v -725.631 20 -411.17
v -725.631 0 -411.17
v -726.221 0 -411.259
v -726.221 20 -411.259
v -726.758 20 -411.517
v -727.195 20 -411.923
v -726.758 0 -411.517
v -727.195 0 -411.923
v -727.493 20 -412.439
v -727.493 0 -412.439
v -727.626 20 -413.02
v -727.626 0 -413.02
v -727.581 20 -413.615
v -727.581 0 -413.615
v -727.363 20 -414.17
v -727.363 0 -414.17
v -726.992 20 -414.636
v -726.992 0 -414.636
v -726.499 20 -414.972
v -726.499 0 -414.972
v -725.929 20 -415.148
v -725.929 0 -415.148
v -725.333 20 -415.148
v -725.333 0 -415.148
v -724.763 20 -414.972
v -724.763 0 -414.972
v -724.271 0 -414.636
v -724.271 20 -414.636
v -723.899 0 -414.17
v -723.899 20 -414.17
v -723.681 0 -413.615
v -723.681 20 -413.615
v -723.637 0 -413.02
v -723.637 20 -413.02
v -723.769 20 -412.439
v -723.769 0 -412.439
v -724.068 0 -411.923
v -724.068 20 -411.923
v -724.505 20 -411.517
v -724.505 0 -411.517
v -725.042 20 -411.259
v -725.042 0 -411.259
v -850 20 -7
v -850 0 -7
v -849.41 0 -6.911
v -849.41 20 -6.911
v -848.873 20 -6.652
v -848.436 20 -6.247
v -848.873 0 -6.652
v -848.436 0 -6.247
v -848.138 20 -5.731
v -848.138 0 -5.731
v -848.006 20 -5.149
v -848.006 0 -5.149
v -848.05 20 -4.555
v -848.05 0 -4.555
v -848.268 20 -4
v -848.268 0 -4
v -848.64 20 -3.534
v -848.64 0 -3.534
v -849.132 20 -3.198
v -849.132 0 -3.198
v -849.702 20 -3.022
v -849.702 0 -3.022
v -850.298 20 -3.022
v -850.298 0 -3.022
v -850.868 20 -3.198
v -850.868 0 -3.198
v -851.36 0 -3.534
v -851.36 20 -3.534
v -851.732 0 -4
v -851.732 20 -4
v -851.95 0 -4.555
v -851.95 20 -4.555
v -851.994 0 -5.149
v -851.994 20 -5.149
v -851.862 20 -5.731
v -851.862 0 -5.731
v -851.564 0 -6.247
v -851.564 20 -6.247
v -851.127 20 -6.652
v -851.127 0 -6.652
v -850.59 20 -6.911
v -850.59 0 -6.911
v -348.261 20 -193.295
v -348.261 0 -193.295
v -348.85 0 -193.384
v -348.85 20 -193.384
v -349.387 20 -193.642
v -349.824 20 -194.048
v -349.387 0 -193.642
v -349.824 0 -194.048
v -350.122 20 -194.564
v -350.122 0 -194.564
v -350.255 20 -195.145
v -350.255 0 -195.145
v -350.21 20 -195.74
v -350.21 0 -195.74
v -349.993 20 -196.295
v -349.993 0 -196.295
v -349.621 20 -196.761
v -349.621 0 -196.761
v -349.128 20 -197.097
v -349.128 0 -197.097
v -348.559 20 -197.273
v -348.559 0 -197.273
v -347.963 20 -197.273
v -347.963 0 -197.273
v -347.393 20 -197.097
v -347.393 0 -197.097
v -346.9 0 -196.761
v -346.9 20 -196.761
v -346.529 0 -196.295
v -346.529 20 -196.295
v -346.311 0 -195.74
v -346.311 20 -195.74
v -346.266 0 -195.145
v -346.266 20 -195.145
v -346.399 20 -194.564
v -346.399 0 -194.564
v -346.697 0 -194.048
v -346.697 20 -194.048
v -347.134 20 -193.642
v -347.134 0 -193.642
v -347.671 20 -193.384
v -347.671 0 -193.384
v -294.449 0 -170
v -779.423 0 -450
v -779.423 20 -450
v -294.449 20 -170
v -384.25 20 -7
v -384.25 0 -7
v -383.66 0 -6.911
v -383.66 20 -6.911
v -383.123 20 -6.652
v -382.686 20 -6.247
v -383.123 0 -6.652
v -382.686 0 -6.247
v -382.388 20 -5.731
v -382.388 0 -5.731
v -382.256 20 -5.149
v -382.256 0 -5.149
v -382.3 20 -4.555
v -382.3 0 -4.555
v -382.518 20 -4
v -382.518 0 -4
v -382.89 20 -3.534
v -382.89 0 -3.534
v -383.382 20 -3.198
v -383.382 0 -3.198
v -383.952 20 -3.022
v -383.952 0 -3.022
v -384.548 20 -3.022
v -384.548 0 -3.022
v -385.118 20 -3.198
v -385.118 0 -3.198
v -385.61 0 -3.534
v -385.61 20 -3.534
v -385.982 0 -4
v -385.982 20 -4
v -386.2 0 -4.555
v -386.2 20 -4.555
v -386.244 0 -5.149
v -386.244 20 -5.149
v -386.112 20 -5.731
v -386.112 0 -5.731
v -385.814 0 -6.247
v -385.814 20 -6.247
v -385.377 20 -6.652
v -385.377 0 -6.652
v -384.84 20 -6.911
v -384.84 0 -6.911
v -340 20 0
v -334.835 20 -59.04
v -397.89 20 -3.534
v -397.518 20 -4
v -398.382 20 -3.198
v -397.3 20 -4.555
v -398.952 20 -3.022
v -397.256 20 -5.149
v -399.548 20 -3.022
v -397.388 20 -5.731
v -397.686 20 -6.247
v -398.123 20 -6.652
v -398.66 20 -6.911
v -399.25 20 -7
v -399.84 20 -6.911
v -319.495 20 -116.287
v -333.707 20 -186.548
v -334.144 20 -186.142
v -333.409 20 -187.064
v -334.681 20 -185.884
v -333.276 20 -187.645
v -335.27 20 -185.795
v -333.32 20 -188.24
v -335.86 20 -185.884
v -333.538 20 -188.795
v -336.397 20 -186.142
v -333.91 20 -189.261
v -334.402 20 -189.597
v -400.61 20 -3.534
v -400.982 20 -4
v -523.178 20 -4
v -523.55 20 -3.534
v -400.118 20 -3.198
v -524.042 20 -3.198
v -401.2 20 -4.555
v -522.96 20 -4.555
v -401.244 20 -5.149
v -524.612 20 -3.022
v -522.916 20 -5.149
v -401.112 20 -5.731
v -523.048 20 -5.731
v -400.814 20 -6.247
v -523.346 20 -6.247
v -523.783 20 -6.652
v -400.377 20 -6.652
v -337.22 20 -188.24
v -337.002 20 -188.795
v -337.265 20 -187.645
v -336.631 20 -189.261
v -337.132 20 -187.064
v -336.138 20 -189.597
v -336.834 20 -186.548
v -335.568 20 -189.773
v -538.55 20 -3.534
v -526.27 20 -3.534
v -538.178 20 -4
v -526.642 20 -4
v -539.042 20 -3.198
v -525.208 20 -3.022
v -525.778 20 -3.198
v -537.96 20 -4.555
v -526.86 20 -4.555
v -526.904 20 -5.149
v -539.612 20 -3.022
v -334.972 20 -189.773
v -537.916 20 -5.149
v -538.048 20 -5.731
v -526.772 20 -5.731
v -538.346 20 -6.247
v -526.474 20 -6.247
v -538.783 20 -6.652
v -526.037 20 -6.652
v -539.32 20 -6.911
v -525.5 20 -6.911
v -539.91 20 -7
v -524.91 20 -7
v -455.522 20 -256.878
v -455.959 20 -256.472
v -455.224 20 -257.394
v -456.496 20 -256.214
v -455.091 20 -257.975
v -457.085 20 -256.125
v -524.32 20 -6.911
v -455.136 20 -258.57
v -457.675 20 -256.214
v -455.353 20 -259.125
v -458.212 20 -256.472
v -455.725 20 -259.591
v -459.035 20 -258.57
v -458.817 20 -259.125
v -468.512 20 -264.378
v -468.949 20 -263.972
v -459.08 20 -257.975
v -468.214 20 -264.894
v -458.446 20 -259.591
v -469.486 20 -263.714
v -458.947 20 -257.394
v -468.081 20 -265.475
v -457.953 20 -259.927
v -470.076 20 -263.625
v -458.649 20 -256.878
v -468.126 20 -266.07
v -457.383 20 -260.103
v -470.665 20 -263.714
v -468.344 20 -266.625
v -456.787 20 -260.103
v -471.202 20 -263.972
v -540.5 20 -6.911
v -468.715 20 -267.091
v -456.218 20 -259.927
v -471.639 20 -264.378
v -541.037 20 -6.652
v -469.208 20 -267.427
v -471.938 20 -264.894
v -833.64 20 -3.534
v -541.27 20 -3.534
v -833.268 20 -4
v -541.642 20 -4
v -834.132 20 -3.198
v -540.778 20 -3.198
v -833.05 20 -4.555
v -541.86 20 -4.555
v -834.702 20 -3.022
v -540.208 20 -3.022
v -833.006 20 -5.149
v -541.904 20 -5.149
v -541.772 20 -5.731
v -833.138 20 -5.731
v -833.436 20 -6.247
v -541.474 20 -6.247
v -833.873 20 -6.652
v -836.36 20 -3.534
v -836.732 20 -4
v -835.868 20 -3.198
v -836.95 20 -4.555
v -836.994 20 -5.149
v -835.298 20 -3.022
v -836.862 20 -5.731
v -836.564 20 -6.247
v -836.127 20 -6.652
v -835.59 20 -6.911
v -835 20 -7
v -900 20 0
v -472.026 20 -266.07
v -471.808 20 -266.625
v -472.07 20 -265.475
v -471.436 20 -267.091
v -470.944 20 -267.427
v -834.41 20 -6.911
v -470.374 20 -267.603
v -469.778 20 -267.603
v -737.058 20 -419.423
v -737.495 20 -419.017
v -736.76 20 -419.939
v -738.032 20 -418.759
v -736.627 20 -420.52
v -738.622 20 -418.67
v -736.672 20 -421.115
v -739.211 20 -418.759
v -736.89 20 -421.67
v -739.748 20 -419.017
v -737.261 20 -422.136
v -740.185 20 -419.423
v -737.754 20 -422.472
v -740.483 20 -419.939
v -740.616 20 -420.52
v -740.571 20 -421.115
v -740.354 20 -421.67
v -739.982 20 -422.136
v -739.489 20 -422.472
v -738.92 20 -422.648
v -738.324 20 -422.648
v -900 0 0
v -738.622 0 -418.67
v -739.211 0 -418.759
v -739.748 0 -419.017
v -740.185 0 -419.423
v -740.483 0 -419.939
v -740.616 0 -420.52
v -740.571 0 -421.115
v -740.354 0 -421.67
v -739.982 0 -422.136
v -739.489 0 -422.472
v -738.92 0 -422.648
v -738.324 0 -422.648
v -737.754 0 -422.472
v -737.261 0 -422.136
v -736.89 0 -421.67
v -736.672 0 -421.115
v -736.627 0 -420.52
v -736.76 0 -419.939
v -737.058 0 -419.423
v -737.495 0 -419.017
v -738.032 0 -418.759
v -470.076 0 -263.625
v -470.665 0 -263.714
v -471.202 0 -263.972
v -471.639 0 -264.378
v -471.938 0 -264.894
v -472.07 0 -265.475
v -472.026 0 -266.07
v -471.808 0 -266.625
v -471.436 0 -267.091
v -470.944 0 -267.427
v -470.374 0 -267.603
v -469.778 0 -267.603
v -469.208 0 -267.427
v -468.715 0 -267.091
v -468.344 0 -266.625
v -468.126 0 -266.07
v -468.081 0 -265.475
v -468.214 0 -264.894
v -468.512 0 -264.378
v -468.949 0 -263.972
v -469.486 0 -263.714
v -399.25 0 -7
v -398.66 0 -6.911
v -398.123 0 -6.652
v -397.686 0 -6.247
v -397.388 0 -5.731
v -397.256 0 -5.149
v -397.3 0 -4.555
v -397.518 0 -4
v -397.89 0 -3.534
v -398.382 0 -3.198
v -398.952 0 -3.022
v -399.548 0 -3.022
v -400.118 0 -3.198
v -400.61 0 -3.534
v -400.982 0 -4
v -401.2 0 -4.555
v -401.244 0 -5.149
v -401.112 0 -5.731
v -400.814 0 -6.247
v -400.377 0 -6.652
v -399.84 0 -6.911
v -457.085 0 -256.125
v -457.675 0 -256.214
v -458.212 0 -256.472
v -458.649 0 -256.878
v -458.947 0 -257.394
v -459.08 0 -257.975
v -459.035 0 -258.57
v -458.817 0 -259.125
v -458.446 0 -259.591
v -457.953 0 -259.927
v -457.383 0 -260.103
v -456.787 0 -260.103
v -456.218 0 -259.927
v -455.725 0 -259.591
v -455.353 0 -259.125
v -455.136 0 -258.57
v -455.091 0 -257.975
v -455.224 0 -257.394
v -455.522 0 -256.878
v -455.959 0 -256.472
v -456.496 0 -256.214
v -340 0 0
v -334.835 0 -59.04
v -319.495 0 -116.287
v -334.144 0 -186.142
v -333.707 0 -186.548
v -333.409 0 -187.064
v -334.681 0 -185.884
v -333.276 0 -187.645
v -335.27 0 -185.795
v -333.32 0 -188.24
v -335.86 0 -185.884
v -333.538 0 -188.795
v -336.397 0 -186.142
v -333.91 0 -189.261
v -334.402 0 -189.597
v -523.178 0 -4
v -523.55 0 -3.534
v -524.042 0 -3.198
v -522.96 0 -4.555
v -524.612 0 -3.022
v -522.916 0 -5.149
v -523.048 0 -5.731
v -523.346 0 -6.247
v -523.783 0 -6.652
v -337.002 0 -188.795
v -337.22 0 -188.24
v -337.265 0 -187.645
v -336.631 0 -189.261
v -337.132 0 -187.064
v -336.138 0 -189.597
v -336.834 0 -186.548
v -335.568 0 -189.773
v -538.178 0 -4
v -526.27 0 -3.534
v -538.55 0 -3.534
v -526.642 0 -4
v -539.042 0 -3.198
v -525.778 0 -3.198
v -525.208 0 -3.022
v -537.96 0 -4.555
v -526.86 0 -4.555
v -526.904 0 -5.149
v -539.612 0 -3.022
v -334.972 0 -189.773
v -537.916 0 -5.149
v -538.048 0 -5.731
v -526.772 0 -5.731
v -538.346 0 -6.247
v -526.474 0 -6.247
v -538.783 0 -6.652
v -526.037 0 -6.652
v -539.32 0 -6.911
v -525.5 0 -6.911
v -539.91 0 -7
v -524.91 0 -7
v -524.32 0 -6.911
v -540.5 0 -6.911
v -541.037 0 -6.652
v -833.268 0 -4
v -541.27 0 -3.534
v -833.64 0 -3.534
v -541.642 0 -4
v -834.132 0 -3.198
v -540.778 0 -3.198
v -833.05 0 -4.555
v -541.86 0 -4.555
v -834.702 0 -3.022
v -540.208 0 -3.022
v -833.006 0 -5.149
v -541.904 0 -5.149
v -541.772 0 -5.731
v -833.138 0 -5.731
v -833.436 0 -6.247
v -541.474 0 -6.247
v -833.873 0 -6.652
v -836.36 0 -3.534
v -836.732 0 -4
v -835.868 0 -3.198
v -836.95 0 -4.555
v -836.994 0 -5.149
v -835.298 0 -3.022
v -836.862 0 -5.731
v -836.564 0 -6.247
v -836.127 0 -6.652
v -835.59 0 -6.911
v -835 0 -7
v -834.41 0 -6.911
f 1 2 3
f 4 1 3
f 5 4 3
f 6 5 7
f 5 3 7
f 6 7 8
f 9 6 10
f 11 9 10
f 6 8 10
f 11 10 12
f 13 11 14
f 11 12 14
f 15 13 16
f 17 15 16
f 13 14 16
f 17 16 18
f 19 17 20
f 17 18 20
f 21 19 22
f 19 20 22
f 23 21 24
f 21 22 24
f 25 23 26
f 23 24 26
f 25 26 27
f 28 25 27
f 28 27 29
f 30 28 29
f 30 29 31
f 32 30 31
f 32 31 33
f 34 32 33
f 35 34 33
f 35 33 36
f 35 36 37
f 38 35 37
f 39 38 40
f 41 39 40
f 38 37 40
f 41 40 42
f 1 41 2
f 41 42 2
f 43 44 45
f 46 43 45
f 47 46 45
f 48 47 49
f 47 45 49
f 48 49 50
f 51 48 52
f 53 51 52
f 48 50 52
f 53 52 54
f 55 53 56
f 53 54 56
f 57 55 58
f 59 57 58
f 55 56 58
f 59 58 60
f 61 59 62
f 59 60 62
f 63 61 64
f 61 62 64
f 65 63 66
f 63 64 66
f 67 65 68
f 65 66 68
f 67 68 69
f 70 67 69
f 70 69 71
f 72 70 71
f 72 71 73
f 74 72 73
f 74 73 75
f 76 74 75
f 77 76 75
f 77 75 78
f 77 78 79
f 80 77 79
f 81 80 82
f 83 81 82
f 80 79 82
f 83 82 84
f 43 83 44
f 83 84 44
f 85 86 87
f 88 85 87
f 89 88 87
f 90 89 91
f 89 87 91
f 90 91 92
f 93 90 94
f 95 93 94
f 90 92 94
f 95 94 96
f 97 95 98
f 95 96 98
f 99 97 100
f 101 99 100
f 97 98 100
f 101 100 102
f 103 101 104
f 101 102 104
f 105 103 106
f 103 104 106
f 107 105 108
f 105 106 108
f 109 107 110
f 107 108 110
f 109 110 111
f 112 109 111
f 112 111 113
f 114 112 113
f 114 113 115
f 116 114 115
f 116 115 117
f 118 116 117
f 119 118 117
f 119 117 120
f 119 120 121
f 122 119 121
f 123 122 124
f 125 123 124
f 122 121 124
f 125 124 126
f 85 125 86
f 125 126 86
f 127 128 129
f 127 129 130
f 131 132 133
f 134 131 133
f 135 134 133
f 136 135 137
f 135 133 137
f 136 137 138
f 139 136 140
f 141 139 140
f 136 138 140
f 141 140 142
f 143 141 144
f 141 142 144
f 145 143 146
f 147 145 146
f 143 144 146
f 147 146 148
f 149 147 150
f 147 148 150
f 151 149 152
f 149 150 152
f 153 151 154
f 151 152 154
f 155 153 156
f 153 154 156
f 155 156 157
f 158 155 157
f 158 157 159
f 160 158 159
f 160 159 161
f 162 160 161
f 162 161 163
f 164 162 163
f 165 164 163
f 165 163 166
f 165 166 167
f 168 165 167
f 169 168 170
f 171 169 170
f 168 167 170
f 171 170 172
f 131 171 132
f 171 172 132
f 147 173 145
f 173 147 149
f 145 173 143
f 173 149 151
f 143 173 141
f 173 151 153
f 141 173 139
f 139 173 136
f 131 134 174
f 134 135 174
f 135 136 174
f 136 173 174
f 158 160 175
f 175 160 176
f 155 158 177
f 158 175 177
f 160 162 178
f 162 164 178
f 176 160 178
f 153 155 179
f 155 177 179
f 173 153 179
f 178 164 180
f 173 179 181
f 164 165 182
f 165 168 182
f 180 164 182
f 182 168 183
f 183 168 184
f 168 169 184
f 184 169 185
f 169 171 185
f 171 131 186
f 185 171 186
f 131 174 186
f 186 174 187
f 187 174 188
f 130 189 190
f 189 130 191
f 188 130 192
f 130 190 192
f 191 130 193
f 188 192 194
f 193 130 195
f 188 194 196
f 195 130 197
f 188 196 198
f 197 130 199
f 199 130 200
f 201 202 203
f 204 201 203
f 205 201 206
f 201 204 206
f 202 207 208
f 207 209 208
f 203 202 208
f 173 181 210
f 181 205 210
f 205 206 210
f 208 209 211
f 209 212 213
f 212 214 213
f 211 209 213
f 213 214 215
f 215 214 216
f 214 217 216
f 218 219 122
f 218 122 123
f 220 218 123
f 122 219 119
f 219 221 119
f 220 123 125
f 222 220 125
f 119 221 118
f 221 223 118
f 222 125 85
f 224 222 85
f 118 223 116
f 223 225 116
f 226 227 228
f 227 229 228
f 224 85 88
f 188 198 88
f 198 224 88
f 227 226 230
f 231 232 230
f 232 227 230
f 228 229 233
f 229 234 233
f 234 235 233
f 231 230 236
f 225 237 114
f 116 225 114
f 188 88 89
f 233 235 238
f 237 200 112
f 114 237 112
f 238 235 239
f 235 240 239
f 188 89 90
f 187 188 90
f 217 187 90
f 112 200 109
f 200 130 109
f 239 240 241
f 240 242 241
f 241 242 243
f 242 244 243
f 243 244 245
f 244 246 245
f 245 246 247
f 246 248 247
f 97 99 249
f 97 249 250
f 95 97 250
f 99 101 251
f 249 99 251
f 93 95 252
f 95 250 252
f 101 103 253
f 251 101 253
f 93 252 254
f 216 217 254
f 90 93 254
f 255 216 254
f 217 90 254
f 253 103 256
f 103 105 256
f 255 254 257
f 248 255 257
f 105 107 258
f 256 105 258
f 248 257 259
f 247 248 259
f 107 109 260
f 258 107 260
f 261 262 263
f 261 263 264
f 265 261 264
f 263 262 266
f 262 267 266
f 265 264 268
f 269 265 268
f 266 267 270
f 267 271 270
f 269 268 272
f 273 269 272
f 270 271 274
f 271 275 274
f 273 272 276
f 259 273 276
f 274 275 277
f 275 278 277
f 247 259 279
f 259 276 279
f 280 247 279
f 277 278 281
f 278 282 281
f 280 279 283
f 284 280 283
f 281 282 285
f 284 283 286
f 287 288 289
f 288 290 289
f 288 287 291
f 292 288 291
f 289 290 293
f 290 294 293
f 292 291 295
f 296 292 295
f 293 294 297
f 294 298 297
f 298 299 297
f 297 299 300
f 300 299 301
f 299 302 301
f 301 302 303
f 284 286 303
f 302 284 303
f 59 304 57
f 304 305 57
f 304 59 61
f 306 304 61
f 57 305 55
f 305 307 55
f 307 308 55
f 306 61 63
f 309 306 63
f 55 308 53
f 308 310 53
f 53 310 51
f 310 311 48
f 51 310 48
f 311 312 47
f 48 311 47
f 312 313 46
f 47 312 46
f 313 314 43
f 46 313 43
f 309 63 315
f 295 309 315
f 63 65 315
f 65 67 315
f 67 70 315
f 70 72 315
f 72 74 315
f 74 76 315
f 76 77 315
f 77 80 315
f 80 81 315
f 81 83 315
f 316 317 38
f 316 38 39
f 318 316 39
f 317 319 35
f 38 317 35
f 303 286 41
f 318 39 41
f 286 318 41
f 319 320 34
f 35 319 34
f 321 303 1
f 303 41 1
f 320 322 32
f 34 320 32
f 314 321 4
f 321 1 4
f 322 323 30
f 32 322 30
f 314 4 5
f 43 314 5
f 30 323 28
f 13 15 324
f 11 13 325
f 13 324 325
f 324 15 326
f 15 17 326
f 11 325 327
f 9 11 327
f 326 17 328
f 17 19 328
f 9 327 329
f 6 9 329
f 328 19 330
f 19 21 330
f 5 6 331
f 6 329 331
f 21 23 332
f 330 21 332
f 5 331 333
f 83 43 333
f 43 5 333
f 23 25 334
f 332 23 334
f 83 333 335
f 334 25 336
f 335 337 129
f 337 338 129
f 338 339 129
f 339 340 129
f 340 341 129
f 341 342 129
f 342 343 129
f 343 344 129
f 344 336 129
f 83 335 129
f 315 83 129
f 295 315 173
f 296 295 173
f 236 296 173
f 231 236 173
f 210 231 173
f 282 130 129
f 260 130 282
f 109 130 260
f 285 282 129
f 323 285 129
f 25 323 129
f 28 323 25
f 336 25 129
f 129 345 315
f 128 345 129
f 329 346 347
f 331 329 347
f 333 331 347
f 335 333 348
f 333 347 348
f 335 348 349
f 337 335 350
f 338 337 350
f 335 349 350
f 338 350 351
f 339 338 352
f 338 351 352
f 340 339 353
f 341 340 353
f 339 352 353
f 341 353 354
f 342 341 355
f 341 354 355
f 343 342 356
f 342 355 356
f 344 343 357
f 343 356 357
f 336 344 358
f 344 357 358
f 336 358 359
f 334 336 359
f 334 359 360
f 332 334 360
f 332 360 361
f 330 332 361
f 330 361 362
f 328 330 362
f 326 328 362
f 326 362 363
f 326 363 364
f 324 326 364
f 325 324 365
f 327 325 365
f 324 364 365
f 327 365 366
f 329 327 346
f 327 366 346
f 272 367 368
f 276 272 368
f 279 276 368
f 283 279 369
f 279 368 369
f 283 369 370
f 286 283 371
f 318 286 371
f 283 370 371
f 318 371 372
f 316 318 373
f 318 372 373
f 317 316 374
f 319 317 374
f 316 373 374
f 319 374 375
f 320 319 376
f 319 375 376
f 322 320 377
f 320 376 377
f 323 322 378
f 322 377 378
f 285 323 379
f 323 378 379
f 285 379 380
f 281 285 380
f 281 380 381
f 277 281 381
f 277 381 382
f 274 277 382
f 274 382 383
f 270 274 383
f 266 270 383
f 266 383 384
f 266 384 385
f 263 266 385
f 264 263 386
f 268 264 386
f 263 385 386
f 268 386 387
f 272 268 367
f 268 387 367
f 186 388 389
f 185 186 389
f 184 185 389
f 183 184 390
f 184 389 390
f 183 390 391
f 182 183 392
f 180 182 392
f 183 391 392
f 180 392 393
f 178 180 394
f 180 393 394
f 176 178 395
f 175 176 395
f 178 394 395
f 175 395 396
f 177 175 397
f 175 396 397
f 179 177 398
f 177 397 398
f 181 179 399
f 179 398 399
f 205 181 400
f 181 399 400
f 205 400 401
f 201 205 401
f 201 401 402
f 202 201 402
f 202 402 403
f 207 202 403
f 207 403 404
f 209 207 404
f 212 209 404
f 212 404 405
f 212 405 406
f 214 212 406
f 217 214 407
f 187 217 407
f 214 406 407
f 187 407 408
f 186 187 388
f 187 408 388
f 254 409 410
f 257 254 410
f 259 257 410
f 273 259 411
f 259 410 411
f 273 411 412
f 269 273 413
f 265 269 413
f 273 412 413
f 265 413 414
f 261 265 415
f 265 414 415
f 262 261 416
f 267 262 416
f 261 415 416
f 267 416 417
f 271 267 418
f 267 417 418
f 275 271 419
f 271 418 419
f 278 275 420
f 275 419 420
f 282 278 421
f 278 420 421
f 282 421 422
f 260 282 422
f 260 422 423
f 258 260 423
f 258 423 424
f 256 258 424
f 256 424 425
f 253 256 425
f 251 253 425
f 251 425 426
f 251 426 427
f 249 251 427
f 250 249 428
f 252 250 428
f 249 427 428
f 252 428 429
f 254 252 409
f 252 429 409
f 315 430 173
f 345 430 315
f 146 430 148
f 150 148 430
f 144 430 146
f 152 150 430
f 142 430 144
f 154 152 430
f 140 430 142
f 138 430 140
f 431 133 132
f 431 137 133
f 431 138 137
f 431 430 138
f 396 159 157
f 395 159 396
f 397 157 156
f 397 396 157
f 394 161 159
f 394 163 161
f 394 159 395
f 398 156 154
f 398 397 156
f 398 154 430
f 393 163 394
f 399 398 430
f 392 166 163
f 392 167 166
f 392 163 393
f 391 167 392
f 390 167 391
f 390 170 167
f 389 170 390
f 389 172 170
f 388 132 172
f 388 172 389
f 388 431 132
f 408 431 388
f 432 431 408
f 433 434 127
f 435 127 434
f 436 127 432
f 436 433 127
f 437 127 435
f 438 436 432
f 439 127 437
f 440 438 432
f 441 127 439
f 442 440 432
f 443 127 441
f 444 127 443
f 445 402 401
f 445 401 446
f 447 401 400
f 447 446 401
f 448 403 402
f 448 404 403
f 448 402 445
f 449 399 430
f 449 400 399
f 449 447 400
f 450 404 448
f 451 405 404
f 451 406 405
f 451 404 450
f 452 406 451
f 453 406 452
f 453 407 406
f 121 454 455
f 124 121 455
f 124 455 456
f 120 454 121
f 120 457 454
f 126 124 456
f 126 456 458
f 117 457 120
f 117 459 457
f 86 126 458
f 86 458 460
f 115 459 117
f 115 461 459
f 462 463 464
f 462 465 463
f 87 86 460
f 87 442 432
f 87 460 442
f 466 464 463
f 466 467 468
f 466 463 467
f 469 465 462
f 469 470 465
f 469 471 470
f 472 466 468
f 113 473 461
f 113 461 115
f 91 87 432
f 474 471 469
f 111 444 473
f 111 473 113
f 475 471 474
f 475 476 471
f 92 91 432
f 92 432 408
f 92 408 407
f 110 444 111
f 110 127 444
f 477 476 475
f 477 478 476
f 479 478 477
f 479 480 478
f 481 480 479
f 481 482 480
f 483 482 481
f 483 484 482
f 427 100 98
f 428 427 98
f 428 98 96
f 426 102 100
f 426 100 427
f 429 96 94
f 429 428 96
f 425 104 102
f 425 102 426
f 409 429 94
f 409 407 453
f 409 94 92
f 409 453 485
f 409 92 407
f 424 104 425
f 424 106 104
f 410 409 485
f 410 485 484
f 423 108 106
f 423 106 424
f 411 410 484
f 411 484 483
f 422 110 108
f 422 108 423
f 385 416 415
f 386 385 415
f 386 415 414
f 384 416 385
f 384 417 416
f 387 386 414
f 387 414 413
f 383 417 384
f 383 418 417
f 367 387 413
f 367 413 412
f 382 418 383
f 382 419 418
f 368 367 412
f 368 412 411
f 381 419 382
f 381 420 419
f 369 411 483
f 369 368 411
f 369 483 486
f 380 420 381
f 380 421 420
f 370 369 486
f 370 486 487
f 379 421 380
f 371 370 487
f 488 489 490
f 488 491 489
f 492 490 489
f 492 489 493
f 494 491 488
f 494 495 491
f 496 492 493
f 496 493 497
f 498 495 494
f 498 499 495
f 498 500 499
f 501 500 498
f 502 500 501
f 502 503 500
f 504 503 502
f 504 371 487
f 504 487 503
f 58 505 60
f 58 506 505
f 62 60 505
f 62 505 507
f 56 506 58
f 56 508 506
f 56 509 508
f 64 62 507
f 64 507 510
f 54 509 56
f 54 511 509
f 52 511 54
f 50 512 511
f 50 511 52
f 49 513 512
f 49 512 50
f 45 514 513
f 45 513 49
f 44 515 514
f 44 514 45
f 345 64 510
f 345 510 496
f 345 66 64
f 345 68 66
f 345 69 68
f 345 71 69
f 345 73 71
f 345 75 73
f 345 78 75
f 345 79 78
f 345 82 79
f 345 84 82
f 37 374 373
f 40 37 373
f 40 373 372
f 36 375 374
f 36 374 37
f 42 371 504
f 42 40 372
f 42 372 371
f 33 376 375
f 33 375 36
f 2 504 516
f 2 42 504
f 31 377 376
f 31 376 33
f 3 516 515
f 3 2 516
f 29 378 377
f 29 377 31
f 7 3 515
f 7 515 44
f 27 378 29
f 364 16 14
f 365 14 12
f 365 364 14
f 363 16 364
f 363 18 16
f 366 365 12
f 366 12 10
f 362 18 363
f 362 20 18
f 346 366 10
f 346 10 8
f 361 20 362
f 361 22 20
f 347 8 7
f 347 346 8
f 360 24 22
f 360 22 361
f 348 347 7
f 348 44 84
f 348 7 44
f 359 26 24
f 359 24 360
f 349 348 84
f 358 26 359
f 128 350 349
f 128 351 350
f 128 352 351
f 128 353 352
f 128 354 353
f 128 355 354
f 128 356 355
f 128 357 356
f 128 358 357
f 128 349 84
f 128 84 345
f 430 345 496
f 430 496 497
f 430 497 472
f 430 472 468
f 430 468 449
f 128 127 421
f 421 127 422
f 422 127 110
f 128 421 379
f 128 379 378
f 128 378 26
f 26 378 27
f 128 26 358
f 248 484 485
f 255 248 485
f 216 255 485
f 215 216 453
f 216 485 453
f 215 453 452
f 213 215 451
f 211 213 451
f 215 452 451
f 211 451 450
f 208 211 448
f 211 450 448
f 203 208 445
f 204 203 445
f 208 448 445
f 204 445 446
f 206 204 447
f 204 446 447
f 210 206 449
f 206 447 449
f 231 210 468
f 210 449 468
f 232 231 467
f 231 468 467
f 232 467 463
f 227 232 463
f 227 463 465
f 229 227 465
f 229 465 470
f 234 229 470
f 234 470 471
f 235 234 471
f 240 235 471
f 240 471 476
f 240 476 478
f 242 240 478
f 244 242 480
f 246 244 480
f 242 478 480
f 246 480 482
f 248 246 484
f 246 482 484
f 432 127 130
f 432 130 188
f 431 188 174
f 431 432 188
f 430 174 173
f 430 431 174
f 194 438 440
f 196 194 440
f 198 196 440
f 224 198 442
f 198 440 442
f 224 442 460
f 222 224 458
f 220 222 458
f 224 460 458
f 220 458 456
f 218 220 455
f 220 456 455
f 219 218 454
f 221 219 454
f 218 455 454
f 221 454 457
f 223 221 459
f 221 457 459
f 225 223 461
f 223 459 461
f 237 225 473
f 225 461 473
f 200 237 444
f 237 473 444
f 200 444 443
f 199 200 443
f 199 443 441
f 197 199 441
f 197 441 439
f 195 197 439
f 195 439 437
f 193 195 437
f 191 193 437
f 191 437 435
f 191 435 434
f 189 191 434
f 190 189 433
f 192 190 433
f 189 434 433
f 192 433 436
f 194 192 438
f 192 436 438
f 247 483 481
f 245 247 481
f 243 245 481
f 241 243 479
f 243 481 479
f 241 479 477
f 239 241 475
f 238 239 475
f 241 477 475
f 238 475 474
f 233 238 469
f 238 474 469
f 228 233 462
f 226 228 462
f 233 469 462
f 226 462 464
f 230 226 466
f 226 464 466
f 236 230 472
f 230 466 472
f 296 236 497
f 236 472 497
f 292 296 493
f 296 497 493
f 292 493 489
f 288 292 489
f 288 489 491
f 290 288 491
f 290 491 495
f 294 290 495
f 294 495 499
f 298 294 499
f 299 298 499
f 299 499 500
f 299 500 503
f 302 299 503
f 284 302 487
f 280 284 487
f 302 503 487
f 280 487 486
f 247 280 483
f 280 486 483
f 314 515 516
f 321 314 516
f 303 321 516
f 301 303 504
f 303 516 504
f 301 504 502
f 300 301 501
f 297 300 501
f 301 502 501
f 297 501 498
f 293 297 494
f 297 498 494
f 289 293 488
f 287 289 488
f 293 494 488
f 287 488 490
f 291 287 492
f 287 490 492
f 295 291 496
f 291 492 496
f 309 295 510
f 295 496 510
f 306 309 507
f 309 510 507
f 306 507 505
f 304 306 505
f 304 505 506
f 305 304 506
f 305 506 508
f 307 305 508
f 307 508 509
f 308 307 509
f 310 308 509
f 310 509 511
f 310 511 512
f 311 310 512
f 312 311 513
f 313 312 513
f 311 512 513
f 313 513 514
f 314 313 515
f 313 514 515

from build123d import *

# Parameters (mm, degrees)
BOSS_EXTRUDE1_DEPTH = 20
SKETCH2_R           = 2
CUT_EXTRUDE1_DEPTH  = 20


with BuildPart() as part:
    # Sketch1 → Boss-Extrude1 (new body)
    with BuildSketch(Plane(origin=(0, 0, 0), x_dir=(1, 0, 0), z_dir=(0, 1, 0))):
        with BuildLine():
            Line((-340, 0), (-900, 0))
            Line((-900, 0), (-779.422863406, 450))
            Line((-779.422863406, 450), (-294.448637287, 170))
            ThreePointArc((-294.448637287, 170), (-328.414780938, 87.998475335), (-340, 0))
        make_face()
    extrude(amount=BOSS_EXTRUDE1_DEPTH)

    # Sketch2 → Cut-Extrude1 (cut)
    with BuildSketch(Plane.XZ):
        with Locations(Location((-850, -5, 0), (0, 0, 270))):
            Circle(SKETCH2_R)
        with Locations(Location((-835, -5, 0), (0, 0, 270))):
            Circle(SKETCH2_R)
        with Locations(Location((-539.91, -5, 0), (0, 0, 270))):
            Circle(SKETCH2_R)
        with Locations(Location((-524.91, -5, 0), (0, 0, 270))):
            Circle(SKETCH2_R)
        with Locations(Location((-399.25, -5, 0), (0, 0, 270))):
            Circle(SKETCH2_R)
        with Locations(Location((-384.25, -5, 0), (0, 0, 270))):
            Circle(SKETCH2_R)
        with Locations(Location((-348.260642461, -195.294872981, 0), (0, 0, 90))):
            Circle(SKETCH2_R)
        with Locations(Location((-335.270261404, -187.794872981, 0), (0, 0, 90))):
            Circle(SKETCH2_R)
        with Locations(Location((-457.0853947, -258.124872981, 0), (0, 0, 90))):
            Circle(SKETCH2_R)
        with Locations(Location((-470.075775757, -265.624872981, 0), (0, 0, 90))):
            Circle(SKETCH2_R)
        with Locations(Location((-725.63121216, -413.169872981, 0), (0, 0, 90))):
            Circle(SKETCH2_R)
        with Locations(Location((-738.621593217, -420.669872981, 0), (0, 0, 90))):
            Circle(SKETCH2_R)
    extrude(amount=-CUT_EXTRUDE1_DEPTH, mode=Mode.SUBTRACT)


solid = part.part
